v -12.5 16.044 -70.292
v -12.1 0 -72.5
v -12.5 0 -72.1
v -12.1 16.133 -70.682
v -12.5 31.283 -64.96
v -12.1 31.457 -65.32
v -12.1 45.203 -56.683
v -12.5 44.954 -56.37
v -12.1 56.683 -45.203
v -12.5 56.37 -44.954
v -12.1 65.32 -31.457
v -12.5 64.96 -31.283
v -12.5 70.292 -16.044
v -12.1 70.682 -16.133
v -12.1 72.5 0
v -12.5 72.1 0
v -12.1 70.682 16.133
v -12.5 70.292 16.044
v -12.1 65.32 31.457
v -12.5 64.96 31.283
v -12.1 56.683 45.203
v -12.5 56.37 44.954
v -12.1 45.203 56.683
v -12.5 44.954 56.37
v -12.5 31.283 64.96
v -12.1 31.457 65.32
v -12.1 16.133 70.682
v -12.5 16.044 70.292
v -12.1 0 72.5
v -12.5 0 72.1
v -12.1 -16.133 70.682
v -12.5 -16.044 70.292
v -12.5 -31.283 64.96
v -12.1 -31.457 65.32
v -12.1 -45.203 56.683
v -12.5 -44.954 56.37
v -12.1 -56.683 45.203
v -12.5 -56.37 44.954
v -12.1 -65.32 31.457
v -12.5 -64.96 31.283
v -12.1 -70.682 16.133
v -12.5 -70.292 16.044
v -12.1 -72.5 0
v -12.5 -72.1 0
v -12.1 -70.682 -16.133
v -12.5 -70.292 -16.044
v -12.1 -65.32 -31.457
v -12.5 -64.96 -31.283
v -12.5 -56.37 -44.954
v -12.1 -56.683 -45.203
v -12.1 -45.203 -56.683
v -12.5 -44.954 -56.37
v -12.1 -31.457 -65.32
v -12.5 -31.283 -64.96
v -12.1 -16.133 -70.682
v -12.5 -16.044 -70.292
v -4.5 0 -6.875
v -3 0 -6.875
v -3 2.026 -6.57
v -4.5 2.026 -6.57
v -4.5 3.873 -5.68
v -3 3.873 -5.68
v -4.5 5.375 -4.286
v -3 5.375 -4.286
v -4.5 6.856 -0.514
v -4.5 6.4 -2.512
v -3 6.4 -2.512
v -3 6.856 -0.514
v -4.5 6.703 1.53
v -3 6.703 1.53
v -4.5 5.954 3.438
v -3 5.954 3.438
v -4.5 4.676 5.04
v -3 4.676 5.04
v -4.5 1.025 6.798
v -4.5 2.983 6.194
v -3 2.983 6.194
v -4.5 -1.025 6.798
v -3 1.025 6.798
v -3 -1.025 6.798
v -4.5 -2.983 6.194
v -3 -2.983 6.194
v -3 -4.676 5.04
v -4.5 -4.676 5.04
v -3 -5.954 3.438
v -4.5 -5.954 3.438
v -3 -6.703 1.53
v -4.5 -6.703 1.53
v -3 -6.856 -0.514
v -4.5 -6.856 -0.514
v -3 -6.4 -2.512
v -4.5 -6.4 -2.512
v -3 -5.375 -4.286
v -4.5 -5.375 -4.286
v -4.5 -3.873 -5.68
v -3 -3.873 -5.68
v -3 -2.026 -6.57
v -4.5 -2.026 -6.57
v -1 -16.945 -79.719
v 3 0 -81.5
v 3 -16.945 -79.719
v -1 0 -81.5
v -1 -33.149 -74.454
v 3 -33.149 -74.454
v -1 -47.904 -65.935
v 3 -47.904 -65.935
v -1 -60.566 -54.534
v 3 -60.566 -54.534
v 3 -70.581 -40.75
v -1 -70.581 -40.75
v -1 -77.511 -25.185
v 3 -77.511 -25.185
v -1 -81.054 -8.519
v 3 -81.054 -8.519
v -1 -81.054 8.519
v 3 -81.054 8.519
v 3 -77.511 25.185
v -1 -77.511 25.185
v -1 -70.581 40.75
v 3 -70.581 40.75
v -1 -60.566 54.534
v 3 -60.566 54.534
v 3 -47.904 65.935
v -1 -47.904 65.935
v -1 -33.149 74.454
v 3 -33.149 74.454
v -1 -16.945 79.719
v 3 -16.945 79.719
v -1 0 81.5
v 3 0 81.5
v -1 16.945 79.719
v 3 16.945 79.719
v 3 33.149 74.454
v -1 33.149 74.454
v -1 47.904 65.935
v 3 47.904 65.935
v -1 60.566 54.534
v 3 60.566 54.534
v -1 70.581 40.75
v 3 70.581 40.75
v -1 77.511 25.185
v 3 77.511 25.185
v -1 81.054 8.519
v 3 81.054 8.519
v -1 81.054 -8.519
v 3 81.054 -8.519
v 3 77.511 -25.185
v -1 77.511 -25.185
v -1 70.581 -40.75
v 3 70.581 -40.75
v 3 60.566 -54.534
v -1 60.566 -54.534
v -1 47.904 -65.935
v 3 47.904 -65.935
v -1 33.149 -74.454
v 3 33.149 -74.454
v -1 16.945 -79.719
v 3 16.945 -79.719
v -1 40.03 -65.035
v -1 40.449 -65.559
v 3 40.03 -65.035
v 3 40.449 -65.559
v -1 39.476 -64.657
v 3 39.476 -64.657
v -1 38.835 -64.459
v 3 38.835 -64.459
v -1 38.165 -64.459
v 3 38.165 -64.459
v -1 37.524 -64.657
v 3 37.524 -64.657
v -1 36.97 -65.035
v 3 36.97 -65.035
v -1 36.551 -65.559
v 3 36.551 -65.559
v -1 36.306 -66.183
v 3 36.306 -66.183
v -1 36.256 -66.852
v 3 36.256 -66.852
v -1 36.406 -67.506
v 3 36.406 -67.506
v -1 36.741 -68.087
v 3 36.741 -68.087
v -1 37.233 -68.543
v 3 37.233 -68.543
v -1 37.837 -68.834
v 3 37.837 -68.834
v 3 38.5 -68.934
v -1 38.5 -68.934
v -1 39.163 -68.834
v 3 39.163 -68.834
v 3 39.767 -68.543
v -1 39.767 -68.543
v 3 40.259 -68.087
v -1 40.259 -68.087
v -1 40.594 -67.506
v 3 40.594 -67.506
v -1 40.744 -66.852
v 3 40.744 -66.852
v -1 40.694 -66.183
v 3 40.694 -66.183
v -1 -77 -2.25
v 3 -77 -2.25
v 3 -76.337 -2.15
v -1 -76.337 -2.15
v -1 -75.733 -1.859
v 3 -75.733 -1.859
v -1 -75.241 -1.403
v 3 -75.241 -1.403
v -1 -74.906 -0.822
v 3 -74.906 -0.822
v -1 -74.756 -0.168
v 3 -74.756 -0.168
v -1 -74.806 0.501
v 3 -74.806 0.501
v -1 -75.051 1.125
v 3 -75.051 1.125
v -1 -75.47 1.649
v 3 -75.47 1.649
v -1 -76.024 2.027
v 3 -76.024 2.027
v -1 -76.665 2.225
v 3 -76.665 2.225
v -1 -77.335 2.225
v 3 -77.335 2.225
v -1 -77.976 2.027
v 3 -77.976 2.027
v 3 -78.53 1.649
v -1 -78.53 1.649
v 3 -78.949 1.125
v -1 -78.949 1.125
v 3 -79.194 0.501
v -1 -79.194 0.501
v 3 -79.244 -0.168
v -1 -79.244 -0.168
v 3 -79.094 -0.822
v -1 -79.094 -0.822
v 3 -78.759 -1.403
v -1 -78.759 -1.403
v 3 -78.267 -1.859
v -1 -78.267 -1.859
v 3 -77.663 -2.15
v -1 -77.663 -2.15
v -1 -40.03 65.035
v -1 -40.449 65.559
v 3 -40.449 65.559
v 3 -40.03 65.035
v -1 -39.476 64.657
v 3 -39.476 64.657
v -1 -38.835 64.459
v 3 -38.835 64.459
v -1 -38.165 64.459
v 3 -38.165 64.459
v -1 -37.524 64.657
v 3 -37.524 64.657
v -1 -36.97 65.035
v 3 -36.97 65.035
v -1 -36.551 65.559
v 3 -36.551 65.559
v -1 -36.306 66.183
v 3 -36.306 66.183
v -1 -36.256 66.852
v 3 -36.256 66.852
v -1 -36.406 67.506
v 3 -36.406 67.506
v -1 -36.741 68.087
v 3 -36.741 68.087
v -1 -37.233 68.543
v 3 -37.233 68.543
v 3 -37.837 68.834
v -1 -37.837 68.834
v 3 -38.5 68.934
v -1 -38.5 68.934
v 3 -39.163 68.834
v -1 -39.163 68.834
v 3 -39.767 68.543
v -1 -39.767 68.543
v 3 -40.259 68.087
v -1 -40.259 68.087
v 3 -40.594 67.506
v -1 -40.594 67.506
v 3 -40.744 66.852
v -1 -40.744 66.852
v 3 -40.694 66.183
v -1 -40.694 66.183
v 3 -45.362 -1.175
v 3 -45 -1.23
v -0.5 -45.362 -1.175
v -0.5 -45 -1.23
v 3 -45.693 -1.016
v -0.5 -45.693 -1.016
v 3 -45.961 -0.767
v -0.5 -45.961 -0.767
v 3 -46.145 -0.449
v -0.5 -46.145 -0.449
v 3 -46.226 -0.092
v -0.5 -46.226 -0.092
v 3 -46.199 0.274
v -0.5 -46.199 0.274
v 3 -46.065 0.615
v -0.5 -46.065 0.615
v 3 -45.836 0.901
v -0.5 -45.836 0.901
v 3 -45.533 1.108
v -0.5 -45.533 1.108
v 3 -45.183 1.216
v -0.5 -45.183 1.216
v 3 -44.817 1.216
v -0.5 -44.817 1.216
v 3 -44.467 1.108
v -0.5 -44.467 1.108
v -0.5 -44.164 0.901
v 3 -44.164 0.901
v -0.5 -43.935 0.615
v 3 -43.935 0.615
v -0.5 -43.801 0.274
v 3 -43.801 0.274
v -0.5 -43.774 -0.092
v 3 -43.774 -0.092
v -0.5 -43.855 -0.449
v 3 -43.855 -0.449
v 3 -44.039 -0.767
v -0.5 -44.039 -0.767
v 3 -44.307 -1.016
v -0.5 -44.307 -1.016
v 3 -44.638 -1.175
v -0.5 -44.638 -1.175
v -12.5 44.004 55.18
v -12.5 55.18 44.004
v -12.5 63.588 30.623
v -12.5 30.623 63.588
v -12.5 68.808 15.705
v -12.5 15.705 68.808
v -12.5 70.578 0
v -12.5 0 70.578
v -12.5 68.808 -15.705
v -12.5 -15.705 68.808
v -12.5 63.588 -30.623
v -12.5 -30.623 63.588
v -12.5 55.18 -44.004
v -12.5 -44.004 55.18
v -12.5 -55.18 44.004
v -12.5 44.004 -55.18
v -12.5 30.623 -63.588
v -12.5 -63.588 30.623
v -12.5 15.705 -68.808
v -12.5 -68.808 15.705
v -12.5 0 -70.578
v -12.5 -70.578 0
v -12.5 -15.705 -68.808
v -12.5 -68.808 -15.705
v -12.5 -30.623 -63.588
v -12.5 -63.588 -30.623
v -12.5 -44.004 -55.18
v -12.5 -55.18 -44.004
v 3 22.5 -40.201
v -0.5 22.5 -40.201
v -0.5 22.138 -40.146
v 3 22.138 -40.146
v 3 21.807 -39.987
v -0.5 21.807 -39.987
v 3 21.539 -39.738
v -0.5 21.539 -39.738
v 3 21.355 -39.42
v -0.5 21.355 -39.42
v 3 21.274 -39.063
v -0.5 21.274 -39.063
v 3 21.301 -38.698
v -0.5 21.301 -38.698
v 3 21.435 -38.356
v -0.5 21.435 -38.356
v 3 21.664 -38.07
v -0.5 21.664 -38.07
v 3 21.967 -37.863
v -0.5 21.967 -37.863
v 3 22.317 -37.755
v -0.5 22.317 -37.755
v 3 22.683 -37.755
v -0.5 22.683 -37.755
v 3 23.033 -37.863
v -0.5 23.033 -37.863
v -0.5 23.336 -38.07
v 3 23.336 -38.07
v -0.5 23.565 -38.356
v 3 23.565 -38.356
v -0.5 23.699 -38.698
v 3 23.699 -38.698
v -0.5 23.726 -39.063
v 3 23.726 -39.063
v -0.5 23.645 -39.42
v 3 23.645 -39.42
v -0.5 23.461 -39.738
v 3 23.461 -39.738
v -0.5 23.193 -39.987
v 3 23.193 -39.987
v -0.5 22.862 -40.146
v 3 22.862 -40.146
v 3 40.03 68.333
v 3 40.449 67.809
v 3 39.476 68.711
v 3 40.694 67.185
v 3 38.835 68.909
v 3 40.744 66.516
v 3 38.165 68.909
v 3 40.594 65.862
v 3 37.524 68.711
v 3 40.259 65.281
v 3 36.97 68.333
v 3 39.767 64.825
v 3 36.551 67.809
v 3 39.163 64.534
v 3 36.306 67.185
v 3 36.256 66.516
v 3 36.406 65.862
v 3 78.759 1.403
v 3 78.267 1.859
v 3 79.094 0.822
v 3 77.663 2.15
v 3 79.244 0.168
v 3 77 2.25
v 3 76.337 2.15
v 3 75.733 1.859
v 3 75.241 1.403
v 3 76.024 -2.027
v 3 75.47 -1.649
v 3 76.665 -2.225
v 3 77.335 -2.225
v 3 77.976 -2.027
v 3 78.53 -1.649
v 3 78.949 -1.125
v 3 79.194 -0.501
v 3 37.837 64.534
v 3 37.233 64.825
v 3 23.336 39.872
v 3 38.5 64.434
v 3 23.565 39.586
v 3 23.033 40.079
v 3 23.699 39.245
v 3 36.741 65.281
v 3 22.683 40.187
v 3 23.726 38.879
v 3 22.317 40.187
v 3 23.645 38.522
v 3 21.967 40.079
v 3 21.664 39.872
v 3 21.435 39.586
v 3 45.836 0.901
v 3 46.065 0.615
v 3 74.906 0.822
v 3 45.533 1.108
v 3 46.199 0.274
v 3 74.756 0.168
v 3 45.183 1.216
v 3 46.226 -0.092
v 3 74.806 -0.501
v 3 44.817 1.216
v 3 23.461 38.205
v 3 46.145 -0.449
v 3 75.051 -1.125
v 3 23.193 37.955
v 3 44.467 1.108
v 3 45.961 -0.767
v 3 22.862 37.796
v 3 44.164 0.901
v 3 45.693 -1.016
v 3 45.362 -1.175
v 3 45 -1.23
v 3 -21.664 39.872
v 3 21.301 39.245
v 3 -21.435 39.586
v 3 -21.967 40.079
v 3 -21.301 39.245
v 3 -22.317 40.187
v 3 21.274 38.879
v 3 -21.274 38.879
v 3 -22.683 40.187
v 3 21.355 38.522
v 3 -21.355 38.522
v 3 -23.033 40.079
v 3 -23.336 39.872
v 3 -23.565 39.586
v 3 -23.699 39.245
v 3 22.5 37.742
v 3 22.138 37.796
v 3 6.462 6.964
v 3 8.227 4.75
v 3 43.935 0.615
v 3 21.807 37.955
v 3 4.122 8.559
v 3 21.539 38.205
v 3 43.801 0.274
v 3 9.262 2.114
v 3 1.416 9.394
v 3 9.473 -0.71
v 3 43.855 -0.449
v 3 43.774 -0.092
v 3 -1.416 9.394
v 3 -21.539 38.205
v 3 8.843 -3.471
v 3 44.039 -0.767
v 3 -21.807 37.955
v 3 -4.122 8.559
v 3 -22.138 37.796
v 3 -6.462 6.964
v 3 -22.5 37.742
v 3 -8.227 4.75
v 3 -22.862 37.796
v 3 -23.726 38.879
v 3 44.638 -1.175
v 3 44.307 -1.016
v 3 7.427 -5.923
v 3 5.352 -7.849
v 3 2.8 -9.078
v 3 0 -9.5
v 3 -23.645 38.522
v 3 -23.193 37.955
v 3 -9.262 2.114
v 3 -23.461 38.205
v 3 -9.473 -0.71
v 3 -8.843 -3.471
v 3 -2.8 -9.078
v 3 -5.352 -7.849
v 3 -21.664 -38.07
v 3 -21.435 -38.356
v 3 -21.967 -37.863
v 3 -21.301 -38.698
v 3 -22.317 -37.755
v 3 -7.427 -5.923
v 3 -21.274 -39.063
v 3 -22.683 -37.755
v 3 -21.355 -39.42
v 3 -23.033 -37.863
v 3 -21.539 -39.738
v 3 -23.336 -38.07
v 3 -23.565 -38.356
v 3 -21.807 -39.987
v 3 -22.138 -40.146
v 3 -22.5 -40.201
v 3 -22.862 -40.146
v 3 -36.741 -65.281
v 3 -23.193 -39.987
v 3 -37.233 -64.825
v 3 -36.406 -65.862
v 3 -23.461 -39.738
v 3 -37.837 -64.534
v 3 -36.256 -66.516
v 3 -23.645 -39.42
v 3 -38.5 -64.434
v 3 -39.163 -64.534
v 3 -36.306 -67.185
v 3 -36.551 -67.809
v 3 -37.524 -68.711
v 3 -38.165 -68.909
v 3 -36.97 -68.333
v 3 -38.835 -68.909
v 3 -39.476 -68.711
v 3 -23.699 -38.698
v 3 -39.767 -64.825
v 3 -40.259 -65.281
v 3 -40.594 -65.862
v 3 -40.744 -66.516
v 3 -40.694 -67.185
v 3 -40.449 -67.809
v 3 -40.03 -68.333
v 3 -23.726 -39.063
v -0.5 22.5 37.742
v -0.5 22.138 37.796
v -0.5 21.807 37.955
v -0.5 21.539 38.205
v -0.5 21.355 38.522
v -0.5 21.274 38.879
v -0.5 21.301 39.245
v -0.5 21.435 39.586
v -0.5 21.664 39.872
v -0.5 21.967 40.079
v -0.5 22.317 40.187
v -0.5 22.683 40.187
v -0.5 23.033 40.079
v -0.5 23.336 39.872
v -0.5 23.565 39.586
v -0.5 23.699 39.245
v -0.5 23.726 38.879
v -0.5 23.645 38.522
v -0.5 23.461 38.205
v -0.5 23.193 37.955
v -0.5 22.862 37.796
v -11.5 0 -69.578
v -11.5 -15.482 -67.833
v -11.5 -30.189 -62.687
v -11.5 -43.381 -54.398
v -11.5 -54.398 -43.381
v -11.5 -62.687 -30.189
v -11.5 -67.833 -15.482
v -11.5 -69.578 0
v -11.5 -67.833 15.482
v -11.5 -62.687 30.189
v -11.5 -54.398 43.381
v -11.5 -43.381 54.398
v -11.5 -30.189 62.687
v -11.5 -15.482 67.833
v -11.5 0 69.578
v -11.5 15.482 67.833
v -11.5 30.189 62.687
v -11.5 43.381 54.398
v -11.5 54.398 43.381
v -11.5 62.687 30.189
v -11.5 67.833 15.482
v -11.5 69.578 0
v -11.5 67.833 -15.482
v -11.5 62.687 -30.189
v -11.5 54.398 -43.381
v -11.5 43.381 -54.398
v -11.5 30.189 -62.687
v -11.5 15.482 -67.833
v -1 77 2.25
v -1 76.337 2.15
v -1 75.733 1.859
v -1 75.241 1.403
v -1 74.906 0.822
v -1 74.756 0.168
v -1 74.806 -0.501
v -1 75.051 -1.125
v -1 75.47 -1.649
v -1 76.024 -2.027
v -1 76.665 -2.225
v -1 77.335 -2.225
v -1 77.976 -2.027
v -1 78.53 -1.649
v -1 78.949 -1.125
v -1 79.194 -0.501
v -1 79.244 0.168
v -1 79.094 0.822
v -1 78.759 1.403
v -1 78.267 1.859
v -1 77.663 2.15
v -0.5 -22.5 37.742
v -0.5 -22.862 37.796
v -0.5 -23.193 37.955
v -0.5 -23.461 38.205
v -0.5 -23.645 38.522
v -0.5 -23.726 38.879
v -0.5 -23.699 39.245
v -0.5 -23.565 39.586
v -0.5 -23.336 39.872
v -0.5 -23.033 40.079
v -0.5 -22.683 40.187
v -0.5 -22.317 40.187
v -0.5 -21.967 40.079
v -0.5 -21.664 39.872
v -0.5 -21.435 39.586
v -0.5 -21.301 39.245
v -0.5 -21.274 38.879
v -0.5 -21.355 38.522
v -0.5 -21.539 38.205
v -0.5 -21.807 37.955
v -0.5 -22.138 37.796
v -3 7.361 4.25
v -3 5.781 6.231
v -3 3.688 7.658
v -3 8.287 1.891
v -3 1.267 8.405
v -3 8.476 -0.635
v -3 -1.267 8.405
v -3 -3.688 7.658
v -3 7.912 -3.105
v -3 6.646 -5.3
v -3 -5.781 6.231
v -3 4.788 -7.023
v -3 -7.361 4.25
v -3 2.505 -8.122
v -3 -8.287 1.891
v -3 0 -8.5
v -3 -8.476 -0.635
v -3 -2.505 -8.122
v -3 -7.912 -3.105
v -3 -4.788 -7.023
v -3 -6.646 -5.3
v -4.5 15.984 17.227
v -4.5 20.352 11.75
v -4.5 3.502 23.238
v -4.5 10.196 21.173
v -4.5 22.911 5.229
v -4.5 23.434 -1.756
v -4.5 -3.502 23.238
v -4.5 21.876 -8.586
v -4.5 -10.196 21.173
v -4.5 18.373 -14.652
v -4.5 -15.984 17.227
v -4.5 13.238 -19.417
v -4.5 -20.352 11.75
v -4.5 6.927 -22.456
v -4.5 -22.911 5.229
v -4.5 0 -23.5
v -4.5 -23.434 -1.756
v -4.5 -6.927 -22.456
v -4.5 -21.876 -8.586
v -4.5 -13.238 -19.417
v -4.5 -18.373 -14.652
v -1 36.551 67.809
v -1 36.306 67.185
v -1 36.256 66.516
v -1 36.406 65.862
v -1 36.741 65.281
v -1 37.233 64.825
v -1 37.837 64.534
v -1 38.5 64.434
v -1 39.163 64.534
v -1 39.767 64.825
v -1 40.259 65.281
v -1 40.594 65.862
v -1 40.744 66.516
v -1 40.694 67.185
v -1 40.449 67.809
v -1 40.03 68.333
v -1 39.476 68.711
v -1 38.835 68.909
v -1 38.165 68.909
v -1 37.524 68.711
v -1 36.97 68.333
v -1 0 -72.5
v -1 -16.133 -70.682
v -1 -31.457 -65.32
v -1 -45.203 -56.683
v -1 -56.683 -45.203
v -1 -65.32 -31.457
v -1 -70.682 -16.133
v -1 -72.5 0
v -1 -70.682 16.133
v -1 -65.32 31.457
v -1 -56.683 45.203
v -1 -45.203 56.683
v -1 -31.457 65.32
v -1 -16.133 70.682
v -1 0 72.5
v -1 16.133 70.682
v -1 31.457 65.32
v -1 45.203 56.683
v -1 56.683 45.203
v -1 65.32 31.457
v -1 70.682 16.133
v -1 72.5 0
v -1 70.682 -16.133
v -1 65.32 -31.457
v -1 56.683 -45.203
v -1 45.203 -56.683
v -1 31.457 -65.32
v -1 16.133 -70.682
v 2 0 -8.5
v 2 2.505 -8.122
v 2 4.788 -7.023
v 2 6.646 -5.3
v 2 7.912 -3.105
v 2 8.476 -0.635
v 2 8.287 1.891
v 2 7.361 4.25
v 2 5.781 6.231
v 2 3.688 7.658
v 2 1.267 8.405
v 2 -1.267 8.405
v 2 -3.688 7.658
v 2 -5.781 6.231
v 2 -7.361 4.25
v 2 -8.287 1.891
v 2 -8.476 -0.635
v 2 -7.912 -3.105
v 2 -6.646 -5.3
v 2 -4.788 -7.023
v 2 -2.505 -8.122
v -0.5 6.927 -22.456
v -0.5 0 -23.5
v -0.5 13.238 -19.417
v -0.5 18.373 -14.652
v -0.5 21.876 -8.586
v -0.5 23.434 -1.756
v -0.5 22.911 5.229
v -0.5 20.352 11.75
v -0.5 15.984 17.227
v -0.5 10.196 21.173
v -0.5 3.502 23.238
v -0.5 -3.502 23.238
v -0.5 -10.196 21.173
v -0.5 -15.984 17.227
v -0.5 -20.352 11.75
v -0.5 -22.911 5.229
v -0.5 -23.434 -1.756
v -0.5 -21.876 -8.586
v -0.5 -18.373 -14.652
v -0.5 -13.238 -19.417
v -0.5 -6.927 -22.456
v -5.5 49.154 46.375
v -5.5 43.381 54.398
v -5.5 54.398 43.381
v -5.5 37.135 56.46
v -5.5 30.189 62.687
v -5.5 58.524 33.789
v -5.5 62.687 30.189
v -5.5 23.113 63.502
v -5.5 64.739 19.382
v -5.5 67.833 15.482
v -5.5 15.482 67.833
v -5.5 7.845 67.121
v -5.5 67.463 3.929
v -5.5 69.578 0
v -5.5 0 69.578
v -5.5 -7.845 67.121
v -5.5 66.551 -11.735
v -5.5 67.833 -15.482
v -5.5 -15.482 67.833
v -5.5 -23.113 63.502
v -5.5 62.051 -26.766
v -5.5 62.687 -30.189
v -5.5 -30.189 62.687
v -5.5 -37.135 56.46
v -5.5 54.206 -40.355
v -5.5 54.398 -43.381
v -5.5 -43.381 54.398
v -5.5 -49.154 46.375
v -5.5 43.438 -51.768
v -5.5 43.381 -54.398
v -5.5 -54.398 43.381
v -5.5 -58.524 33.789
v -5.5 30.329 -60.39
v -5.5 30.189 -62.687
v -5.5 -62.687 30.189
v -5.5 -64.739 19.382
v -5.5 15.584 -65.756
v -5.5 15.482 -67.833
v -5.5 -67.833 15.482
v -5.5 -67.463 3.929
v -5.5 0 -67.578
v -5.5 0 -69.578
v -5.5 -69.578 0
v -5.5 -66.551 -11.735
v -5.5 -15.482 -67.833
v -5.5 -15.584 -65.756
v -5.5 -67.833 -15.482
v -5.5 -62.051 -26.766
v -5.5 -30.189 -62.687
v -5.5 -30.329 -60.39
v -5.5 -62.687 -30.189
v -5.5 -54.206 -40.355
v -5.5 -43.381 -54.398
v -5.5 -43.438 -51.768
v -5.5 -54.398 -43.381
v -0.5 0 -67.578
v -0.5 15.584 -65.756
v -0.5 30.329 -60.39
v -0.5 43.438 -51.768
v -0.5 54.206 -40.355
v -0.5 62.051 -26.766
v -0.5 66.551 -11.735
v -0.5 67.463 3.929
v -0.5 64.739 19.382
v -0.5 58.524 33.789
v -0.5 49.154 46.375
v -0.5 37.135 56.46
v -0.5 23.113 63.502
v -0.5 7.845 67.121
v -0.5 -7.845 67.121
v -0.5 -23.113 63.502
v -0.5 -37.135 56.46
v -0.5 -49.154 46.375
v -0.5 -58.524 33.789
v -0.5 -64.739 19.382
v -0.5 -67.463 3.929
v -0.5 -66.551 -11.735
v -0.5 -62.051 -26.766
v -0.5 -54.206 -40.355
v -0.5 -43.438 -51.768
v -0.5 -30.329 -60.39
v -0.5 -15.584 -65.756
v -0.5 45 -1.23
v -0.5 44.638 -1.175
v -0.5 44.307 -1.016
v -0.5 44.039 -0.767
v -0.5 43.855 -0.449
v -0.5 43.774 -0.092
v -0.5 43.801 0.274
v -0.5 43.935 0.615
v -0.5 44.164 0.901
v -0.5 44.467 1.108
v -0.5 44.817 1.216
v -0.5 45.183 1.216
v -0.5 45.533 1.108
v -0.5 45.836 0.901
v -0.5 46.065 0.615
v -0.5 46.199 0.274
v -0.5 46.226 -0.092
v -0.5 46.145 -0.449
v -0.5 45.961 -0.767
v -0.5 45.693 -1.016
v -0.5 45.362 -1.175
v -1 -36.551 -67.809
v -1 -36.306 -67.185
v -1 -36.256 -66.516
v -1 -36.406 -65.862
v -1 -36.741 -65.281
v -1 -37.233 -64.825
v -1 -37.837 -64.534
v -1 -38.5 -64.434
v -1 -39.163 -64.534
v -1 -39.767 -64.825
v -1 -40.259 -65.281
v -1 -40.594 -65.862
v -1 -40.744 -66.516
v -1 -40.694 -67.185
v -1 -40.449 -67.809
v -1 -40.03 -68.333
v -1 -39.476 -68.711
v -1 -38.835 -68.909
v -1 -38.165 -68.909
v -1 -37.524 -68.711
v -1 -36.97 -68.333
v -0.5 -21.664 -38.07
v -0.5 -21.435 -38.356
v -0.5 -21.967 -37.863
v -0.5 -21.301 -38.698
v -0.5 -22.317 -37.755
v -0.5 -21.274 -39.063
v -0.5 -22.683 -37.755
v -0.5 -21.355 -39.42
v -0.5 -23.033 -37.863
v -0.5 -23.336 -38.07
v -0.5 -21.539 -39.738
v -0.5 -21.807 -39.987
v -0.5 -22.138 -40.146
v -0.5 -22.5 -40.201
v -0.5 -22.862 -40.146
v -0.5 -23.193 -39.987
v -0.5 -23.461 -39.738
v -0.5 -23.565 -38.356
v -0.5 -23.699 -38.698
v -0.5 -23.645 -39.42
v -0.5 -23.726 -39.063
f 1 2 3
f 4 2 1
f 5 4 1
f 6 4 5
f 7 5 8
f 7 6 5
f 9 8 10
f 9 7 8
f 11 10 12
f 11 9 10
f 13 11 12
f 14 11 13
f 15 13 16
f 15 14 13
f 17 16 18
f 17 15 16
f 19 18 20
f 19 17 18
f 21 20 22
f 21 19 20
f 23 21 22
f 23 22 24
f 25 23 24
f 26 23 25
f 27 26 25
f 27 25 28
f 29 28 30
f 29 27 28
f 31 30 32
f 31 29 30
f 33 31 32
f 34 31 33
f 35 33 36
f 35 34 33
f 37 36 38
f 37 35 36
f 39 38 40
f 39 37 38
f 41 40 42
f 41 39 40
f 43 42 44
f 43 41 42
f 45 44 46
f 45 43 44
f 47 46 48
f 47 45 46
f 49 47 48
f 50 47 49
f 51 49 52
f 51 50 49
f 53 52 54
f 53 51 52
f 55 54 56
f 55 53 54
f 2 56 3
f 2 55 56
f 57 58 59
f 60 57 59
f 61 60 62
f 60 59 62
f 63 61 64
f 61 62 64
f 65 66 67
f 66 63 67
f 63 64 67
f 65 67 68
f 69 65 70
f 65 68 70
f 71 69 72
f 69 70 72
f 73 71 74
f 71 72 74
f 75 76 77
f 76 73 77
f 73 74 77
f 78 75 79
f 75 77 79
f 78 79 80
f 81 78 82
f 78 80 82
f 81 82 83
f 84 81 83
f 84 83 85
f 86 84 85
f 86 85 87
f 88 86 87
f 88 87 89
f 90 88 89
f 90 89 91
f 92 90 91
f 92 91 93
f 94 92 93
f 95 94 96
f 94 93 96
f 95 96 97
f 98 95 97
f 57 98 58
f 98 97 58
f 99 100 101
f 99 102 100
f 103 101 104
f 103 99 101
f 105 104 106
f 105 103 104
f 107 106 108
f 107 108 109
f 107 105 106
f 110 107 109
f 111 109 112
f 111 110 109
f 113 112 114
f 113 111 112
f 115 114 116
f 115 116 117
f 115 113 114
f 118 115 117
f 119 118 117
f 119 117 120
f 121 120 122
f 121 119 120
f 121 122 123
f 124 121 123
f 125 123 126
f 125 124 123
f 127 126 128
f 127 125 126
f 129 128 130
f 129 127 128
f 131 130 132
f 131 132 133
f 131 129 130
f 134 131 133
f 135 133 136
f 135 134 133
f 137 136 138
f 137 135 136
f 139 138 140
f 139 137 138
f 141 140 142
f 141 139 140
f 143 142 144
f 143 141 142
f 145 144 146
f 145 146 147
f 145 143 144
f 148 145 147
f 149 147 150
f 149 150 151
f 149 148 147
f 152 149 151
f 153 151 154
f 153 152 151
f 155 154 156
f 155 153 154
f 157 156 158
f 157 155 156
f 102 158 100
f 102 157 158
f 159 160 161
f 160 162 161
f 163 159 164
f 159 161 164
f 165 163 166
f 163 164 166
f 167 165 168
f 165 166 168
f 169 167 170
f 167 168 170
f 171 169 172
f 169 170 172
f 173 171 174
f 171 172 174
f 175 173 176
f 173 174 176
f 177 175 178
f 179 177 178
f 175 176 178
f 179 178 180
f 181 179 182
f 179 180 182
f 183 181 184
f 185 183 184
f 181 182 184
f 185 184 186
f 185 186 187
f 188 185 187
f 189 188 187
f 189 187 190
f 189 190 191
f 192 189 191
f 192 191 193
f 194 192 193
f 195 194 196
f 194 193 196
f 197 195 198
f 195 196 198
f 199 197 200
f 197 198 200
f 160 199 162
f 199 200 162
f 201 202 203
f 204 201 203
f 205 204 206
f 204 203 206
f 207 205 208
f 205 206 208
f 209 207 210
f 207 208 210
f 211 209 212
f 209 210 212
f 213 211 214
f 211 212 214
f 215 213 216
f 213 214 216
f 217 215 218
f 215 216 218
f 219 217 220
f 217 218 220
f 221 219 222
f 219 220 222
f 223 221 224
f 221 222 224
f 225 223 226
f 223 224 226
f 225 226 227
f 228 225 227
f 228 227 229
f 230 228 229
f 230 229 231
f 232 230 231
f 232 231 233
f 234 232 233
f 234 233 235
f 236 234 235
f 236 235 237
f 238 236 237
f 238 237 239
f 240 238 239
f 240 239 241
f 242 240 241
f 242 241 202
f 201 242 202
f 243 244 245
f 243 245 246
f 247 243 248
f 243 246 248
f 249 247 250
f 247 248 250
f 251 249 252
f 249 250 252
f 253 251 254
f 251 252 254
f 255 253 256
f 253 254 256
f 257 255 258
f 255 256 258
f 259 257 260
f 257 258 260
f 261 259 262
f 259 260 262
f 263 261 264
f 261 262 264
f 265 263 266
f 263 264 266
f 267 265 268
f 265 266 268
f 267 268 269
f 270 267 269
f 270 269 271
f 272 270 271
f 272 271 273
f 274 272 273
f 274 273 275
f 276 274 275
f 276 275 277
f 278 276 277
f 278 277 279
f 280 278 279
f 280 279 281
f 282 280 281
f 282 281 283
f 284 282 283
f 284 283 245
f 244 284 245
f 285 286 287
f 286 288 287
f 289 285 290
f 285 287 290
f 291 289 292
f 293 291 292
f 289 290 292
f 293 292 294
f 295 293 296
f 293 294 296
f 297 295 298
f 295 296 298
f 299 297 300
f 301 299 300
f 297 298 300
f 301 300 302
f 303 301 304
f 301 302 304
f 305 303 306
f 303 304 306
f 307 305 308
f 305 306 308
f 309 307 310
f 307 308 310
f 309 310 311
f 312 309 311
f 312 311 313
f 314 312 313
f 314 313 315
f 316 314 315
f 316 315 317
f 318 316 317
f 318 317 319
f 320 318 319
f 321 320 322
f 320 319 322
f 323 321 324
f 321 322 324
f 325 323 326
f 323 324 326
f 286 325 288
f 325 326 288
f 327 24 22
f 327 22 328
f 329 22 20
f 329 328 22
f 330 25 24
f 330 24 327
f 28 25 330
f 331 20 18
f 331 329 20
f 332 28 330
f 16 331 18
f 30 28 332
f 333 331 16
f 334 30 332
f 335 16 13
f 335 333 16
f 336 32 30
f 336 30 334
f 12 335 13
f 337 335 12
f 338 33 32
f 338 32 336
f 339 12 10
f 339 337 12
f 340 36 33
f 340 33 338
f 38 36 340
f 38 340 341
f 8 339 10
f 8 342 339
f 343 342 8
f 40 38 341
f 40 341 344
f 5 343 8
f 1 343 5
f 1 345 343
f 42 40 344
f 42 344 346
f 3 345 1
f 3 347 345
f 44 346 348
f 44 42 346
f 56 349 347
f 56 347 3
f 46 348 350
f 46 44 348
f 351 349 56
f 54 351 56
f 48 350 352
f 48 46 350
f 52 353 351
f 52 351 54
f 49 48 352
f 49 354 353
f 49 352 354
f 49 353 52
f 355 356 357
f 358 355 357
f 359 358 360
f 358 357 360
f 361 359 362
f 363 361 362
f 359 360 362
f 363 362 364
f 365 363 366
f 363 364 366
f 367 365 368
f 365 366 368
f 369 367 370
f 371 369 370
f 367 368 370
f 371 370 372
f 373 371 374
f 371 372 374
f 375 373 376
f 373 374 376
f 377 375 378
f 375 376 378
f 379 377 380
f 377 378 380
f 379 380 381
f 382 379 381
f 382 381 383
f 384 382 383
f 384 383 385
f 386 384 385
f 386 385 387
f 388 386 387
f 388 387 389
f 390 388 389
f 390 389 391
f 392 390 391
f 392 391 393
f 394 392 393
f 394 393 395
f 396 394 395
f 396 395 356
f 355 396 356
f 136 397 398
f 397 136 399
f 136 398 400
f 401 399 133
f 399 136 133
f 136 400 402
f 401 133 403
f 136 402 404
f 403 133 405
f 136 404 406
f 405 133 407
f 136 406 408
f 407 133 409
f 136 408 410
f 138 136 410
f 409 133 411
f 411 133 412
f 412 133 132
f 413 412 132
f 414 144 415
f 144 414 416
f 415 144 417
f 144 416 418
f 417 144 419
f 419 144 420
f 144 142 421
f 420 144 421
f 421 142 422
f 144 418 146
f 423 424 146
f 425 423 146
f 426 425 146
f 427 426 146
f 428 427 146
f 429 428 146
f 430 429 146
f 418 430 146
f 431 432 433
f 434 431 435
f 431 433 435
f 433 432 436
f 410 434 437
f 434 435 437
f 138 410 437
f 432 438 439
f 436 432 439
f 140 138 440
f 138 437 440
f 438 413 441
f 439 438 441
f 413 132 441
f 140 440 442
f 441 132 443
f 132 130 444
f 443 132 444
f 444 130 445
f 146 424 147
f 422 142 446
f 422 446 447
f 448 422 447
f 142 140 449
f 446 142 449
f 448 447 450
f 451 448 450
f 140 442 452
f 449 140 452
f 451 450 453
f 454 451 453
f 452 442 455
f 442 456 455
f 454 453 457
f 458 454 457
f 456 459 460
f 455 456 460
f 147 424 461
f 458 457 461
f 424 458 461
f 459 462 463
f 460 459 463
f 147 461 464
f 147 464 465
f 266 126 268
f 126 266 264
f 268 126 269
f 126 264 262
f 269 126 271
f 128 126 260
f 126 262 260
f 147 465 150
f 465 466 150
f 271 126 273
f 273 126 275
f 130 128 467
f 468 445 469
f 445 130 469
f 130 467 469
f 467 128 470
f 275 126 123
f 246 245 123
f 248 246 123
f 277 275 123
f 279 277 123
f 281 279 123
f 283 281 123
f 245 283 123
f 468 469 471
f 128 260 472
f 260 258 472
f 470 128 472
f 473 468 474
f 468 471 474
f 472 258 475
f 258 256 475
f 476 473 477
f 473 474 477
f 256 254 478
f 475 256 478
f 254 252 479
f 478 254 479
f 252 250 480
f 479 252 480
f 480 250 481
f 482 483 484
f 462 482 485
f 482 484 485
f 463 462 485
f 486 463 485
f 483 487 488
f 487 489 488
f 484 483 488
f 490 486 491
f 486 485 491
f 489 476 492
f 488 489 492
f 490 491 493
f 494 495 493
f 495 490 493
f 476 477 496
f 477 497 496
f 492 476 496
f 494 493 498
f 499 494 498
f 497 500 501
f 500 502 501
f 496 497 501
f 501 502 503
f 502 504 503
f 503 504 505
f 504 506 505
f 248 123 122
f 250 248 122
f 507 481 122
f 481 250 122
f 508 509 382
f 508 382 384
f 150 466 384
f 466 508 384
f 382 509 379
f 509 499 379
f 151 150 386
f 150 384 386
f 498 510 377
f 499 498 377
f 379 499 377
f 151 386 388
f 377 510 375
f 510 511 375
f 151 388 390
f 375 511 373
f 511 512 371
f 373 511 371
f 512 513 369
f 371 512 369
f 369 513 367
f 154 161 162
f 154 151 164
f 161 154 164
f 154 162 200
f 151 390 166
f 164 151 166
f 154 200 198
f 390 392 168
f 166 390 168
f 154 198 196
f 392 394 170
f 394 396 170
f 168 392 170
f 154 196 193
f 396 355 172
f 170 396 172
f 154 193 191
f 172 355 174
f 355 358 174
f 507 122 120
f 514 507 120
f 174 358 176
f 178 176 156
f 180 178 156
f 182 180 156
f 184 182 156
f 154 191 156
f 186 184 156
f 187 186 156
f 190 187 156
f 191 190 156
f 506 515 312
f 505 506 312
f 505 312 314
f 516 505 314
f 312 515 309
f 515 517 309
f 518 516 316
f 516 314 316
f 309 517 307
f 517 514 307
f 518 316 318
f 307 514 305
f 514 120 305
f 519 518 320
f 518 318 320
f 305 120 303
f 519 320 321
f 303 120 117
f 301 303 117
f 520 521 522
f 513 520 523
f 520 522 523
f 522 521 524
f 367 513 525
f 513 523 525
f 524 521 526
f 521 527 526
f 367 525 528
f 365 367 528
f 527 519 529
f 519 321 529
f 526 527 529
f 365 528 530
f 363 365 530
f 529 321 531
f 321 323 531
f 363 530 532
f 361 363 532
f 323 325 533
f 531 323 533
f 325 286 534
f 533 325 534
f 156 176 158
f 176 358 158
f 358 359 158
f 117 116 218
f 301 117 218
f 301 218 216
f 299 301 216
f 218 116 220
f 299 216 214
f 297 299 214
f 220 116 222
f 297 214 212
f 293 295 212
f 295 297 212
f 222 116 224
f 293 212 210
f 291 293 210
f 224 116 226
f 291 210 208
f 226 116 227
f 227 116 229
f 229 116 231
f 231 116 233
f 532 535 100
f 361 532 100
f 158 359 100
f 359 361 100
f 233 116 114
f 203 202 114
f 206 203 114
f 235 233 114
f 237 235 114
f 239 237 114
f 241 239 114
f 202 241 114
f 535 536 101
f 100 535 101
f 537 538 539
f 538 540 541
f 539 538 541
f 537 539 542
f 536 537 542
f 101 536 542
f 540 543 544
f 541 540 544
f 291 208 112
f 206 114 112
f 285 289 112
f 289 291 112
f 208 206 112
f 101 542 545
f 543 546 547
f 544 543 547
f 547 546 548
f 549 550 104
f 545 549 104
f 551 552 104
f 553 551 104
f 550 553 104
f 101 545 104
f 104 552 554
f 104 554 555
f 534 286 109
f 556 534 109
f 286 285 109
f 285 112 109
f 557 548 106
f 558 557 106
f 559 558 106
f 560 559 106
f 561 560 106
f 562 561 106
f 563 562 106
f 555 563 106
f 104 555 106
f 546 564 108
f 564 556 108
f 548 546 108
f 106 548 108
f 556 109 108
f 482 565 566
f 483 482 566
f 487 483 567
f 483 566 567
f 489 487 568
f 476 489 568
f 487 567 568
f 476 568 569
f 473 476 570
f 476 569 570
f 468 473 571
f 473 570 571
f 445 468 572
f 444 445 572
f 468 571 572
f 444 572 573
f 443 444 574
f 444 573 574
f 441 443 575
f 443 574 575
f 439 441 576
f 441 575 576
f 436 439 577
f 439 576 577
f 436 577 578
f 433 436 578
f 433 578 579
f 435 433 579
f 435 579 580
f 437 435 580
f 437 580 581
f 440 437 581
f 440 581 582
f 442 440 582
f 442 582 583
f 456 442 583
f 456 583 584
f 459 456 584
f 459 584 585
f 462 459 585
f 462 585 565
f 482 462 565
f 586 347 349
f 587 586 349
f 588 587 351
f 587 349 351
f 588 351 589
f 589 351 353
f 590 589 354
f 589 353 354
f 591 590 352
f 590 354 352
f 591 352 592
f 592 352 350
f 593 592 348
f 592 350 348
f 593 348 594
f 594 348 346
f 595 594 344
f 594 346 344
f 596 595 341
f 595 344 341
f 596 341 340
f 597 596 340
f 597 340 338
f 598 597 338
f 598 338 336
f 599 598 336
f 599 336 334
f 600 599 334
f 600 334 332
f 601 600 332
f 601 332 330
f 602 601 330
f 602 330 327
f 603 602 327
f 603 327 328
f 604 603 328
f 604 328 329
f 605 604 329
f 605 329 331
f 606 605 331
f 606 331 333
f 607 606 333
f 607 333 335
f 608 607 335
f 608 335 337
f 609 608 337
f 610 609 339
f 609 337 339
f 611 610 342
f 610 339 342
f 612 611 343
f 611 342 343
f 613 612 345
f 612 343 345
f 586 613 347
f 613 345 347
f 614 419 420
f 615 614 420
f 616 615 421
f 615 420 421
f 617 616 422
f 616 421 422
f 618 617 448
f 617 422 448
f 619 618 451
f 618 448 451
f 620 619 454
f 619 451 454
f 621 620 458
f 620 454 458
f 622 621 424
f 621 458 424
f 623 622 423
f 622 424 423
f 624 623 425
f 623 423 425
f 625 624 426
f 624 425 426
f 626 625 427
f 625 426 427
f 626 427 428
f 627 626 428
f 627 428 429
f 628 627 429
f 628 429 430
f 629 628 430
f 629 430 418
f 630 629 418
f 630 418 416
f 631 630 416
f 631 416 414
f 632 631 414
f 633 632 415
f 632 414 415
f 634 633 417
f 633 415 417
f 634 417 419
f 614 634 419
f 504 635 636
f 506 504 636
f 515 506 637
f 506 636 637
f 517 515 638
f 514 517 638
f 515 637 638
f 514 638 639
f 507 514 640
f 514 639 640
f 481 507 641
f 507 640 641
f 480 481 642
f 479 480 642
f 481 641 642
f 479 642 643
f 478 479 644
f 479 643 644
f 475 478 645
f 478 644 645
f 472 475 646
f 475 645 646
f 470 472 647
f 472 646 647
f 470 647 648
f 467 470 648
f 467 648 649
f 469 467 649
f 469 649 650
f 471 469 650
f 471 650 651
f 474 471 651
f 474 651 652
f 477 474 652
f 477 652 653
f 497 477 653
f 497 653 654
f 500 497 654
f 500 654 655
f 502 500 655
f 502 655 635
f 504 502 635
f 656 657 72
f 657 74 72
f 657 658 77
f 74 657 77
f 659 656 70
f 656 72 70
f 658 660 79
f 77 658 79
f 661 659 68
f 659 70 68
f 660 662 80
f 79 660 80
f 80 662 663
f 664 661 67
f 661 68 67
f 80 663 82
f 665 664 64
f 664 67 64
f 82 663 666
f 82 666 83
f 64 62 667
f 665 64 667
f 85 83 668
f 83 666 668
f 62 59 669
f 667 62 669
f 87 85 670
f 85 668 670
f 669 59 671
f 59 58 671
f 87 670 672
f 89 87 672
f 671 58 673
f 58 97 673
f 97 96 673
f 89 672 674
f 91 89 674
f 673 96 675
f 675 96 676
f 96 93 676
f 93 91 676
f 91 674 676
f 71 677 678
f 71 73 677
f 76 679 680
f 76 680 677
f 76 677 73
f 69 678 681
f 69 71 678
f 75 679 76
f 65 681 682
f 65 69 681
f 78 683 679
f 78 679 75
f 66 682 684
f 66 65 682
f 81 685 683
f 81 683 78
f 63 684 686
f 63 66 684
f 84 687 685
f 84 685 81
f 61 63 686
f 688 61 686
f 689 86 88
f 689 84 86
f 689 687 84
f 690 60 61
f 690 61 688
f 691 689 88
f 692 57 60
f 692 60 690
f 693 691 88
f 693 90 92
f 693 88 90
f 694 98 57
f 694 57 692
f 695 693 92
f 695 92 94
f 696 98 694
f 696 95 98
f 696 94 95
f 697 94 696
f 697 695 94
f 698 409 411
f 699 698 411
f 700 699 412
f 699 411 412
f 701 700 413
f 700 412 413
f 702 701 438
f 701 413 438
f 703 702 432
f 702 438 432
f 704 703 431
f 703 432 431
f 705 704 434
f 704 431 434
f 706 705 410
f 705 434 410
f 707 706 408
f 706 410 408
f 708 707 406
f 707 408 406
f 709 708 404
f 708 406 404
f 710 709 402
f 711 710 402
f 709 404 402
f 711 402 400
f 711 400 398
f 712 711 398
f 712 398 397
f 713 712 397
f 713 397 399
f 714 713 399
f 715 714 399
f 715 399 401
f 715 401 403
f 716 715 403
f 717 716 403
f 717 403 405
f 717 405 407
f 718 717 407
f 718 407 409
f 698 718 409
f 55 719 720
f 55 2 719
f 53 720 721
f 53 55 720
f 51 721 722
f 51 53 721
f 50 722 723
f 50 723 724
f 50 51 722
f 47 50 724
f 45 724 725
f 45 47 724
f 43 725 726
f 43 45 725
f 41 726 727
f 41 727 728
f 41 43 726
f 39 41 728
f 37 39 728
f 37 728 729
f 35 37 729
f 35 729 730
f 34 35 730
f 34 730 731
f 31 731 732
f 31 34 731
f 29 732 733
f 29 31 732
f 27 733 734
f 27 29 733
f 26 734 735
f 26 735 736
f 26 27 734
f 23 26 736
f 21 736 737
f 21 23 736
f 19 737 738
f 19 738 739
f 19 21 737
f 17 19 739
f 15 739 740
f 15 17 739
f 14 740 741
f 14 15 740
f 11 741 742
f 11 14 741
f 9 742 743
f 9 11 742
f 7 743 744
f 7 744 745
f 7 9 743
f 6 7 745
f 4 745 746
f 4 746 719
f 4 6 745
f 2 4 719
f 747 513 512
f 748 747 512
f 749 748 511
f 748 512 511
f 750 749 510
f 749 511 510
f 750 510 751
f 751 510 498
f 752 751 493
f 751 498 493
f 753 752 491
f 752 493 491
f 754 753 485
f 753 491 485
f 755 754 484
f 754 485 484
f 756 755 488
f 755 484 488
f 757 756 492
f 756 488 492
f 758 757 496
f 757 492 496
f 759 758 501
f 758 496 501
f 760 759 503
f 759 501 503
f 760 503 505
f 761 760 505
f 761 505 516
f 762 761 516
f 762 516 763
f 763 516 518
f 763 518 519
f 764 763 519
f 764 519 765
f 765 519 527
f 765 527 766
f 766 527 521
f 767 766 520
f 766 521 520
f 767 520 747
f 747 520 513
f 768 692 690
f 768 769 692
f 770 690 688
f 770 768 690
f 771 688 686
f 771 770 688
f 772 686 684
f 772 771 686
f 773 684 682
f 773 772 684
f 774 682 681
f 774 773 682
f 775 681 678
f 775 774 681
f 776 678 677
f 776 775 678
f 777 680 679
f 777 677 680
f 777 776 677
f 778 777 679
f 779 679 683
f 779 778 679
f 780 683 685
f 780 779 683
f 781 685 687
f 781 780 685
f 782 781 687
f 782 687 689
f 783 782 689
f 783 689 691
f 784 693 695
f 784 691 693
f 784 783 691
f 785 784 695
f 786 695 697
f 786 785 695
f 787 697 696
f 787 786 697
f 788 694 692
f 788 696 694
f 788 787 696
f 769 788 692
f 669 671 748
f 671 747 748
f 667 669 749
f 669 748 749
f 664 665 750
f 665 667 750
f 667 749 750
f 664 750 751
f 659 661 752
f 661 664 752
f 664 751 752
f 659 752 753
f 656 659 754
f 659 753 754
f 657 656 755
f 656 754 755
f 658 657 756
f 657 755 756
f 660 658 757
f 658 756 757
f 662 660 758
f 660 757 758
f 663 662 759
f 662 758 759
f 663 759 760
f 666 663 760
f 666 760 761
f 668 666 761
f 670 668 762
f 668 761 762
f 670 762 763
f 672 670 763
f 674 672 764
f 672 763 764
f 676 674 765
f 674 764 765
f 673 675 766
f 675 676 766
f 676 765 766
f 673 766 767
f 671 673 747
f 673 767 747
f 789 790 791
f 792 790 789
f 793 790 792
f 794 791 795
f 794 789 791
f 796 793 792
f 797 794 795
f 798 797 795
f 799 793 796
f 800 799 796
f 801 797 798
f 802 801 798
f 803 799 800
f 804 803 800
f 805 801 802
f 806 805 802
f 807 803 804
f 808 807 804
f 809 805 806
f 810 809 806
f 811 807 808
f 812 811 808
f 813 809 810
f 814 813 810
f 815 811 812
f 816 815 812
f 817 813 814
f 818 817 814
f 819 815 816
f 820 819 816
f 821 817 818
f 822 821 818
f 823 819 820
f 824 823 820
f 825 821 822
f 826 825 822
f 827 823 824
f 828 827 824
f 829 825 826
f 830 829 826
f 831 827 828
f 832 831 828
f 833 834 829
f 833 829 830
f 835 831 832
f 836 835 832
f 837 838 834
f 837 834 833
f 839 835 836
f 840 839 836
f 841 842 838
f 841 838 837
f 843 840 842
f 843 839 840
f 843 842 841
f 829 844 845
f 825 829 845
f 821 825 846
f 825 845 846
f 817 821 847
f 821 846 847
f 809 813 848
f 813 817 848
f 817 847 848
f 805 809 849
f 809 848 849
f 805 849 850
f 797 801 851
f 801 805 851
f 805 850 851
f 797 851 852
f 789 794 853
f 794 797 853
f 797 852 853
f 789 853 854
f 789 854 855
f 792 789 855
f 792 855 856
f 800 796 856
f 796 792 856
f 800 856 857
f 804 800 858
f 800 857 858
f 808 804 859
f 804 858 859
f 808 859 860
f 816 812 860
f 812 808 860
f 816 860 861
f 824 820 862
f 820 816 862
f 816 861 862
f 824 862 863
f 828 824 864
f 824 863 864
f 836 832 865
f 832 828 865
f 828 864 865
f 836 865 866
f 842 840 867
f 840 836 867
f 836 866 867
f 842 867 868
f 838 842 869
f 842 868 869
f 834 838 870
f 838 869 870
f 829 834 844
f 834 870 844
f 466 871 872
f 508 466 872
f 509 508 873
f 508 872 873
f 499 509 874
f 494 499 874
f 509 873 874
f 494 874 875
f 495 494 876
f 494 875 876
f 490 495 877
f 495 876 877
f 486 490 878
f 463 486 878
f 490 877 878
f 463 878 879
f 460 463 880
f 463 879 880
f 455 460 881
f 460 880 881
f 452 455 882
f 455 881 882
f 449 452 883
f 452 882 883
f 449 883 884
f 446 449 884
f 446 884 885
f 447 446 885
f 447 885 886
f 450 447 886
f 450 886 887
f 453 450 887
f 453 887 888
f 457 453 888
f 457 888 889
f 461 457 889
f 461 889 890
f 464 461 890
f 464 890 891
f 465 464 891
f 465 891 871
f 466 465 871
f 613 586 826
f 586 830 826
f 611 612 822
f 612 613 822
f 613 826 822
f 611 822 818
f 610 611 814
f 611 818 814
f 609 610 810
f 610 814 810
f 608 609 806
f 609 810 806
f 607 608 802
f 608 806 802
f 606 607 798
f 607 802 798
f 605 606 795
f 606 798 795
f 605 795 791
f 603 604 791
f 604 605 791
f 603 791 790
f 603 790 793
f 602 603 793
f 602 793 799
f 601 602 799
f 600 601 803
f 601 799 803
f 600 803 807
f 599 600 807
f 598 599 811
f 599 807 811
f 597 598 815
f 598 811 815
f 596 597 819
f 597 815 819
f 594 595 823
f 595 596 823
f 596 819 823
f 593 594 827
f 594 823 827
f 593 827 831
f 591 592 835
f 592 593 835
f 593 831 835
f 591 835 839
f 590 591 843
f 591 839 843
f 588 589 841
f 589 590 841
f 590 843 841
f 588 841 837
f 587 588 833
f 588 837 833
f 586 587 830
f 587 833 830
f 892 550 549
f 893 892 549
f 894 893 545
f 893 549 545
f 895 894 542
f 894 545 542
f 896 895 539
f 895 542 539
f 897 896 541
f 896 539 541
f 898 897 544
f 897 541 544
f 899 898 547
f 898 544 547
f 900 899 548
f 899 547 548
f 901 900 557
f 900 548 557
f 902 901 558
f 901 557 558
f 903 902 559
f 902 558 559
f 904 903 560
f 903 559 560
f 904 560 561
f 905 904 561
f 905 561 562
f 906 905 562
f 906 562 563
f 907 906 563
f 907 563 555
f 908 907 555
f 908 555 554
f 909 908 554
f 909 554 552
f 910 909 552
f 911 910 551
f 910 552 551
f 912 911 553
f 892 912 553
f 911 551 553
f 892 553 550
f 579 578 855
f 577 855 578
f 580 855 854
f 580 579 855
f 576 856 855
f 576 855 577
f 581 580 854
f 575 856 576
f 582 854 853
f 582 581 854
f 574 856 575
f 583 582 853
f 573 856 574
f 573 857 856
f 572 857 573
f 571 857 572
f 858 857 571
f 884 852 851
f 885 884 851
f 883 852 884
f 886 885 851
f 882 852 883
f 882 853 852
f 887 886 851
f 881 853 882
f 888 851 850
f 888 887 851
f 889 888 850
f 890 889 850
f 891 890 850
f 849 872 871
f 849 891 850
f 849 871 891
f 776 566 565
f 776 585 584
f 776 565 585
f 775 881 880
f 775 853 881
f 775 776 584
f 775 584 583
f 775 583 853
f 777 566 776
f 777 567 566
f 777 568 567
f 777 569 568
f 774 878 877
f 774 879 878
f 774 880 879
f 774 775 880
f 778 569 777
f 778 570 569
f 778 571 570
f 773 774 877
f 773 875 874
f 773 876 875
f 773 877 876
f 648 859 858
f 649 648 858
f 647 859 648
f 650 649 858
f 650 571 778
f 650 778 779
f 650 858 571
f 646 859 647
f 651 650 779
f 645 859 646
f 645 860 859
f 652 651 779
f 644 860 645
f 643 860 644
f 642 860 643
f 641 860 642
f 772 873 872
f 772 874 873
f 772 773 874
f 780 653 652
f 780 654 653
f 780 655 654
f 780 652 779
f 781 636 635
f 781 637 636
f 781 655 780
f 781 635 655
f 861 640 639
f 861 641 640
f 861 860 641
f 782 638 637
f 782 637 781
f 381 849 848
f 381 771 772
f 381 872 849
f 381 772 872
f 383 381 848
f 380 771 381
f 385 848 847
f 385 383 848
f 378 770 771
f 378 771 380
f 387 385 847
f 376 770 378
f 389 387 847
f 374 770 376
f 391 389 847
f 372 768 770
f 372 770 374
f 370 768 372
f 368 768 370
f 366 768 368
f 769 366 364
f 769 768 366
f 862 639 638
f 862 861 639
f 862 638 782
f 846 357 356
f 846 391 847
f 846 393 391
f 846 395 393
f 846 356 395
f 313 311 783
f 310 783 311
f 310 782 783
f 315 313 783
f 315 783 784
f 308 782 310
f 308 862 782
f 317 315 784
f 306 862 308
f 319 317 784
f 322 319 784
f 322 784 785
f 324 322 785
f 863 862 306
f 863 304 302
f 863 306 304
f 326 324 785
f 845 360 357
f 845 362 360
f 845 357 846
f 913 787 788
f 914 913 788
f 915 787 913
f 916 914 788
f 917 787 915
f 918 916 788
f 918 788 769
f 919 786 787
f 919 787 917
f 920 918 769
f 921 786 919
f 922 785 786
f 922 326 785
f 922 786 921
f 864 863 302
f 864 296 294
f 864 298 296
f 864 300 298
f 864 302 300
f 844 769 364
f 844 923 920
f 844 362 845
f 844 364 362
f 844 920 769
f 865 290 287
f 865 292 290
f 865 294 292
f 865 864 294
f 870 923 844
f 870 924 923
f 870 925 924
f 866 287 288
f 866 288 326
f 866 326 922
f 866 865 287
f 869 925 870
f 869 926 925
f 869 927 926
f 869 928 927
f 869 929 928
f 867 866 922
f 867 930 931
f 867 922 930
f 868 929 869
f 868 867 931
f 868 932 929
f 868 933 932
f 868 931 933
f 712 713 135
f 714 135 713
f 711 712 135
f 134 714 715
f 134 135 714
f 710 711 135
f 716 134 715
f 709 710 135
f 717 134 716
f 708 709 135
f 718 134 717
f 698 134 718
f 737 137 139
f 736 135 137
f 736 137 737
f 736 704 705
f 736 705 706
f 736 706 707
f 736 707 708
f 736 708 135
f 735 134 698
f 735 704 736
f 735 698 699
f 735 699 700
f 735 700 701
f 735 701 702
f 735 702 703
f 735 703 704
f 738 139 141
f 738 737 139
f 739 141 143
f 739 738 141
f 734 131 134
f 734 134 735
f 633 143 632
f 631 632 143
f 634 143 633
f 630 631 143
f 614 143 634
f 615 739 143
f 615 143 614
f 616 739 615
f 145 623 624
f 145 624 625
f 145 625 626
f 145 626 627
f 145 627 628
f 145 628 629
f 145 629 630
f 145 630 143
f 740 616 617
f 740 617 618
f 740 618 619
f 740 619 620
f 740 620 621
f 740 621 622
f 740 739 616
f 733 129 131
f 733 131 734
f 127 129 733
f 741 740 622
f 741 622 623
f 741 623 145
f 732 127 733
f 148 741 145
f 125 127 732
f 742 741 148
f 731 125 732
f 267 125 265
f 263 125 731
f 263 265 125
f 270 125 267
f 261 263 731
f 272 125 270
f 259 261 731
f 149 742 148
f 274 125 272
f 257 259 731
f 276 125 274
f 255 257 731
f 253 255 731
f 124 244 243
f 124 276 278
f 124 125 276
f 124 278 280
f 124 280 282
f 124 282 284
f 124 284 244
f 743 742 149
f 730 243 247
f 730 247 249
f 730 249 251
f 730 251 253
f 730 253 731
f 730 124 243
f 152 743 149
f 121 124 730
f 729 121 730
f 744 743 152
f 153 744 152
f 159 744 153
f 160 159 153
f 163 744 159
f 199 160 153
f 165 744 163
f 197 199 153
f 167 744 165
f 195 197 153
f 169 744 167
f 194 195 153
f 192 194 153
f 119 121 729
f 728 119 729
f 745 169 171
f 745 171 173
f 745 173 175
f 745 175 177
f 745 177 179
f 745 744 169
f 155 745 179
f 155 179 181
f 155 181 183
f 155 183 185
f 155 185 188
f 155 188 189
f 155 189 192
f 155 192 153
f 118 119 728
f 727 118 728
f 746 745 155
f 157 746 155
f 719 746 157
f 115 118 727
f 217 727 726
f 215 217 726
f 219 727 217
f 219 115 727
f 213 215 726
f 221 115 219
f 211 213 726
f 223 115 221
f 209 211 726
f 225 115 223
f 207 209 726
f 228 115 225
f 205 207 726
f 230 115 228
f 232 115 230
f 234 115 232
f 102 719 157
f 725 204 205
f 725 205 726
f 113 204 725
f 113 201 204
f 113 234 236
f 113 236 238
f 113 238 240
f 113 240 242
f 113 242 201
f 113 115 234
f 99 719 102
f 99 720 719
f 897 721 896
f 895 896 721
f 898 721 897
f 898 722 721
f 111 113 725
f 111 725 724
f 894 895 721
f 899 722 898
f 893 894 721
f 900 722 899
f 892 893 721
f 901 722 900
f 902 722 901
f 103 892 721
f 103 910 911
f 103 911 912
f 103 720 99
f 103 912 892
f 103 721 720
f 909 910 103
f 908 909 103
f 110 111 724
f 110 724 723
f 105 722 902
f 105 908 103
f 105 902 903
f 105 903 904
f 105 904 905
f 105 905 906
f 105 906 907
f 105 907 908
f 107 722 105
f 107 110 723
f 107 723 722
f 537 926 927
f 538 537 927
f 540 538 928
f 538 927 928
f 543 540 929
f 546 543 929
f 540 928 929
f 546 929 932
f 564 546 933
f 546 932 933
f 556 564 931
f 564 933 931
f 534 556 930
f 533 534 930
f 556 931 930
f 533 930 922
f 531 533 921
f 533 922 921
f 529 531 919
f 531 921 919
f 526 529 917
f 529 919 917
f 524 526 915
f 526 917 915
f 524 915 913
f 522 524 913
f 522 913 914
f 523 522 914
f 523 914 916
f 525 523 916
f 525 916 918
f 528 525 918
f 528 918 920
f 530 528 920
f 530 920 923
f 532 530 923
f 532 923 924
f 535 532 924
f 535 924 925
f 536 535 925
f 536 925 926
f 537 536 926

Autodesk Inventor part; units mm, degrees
ref_plane "YZ Plane" through (0, 0, 0) normal (1, 0, 0) x (0, 1, 0)
ref_plane "XZ Plane" through (0, 0, 0) normal (0, 1, 0) x (-1, 0, 0)
ref_plane "XY Plane" through (0, 0, 0) normal (0, 0, 1) x (1, 0, 0)
sketch "Sketch1" plane through (0, 0, 0) normal (0, 1, 0) x (-1, 0, 0)
  line L0 (0, -96.425) -> (0, 8.05) construction
  line L1 (-6.1, 0) -> (15.6, 0) construction
  line L2 (-3, -8.5) -> (-3, -72.5)
  line L3 (1, -72.5) -> (12.5, -72.5)
  line L4 (12.5, -72.5) -> (12.5, -69.5777)
  line L5 (12.5, -69.5777) -> (5.5, -69.5777)
  line L6 (4.5, -23.5) -> (4.5, -8.5)
  line L7 (3, -8.5) -> (-3, -8.5)
  line L8 (4.5, -8.5) -> (4.5, -6.875)
  line L9 (4.5, -6.875) -> (3, -6.875)
  line L10 (3, -6.875) -> (3, -8.5)
  line L11 (5.5, -69.5777) -> (5.5, -67.5777)
  line L12 (5.5, -67.5777) -> (4.5, -67.5777)
  line L13 (4.5, -23.5) -> (0.5, -23.5)
  line L14 (0.5, -23.5) -> (0.5, -67.5777)
  line L15 (0.5, -67.5777) -> (4.5, -67.5777)
  line L16 (-3, -72.5) -> (-3, -81.5)
  line L17 (-3, -81.5) -> (1, -81.5)
  line L18 (1, -81.5) -> (1, -72.5)
  dimension "d6" = 69.5777
  dimension "d7" = 8.5
  dimension "d15" = 1.5
  dimension "d17" = 6
  dimension "d18" = 1.625
  dimension "d22" = 7
  dimension "d23" = 1
  dimension "d24" = 2
  dimension "d25" = 64
  dimension "d26" = 4
  dimension "d27" = 15
  dimension "d29" = 4
  dimension "d30" = 9
revolve "Revolution1" add sketch "Sketch1" angle 360 about axis through (0, 0, 0) along (-1, 0, 0)
chamfer "Chamfer1" distance 1 angle 45 2 edges at (3, 0, 8.5) (-12.5, 0, 69.5777)
sketch "Sketch2" plane through (-1, 0, 0) normal (-1, 0, 0) x (0, 0, 1)
  line L0 (0, 114.1) -> (0, -114.1) construction
  line L1 (-114.1, 0) -> (114.1, 0) construction
  circle A0 centre (0, 0) radius 77 construction
  circle A1 centre (0, 0) radius 72.5 construction
  circle A2 centre (0, 0) radius 81.5 construction
  point P0 (0, 77)
  dimension "d31" = 4.5
  dimension "d32" = 4.5
hole "Hole1" at (-1, 77, 0) direction (1, 0, 0) diameter 4.5 end through all clearance for "Flat Head Machine Screw" size "M4" standard "Ansi Metric M Profile"
pattern_circular "Circular Pattern1" count 6 over 360 about axis through (-10, 0, 0) along (1, 0, 0) of "Hole1"
chamfer "Chamfer2" distance 0.4 angle 45 1 edges at (-12.5, 0, 72.5)
sketch "Sketch3" plane through (3, 0, 0) normal (1, 0, 0) x (0, 0, -1)
  line L0 (-114.1, 0) -> (114.1, 0) construction
  line L1 (0, -114.1) -> (0, 114.1) construction
  circle A0 centre (0, 0) radius 45 construction
  point P0 (0, 45)
  point P1 (-38.9711, 22.5)
  point P2 (-38.9711, -22.5)
  point P3 (0, -45)
  point P4 (38.9711, -22.5)
  point P5 (38.9711, 22.5)
  dimension "d46" = 90
  dimension "d49" = 360
hole "Hole2" at (3, 45, 0) at (3, 22.5, 38.9711) at (3, -22.5, 38.9711) at (3, -45, 0) at (3, -22.5, -38.9711) at (3, 22.5, -38.9711) direction (-1, 0, 0) diameter 2.459 depth 6.5 tip angle 118 thread size "M3x0.5" class "6H" standard "ANSI Metric M Profile"
equation "\"d6\" = 0.5 * D_ring"
equation "\"d31\" = d32"
equation "\"D_ring\" = D_ext"
equation "\"D_ext\" = 139.15534"
properties part number "Housing_stage" material "Aluminum 6061"
